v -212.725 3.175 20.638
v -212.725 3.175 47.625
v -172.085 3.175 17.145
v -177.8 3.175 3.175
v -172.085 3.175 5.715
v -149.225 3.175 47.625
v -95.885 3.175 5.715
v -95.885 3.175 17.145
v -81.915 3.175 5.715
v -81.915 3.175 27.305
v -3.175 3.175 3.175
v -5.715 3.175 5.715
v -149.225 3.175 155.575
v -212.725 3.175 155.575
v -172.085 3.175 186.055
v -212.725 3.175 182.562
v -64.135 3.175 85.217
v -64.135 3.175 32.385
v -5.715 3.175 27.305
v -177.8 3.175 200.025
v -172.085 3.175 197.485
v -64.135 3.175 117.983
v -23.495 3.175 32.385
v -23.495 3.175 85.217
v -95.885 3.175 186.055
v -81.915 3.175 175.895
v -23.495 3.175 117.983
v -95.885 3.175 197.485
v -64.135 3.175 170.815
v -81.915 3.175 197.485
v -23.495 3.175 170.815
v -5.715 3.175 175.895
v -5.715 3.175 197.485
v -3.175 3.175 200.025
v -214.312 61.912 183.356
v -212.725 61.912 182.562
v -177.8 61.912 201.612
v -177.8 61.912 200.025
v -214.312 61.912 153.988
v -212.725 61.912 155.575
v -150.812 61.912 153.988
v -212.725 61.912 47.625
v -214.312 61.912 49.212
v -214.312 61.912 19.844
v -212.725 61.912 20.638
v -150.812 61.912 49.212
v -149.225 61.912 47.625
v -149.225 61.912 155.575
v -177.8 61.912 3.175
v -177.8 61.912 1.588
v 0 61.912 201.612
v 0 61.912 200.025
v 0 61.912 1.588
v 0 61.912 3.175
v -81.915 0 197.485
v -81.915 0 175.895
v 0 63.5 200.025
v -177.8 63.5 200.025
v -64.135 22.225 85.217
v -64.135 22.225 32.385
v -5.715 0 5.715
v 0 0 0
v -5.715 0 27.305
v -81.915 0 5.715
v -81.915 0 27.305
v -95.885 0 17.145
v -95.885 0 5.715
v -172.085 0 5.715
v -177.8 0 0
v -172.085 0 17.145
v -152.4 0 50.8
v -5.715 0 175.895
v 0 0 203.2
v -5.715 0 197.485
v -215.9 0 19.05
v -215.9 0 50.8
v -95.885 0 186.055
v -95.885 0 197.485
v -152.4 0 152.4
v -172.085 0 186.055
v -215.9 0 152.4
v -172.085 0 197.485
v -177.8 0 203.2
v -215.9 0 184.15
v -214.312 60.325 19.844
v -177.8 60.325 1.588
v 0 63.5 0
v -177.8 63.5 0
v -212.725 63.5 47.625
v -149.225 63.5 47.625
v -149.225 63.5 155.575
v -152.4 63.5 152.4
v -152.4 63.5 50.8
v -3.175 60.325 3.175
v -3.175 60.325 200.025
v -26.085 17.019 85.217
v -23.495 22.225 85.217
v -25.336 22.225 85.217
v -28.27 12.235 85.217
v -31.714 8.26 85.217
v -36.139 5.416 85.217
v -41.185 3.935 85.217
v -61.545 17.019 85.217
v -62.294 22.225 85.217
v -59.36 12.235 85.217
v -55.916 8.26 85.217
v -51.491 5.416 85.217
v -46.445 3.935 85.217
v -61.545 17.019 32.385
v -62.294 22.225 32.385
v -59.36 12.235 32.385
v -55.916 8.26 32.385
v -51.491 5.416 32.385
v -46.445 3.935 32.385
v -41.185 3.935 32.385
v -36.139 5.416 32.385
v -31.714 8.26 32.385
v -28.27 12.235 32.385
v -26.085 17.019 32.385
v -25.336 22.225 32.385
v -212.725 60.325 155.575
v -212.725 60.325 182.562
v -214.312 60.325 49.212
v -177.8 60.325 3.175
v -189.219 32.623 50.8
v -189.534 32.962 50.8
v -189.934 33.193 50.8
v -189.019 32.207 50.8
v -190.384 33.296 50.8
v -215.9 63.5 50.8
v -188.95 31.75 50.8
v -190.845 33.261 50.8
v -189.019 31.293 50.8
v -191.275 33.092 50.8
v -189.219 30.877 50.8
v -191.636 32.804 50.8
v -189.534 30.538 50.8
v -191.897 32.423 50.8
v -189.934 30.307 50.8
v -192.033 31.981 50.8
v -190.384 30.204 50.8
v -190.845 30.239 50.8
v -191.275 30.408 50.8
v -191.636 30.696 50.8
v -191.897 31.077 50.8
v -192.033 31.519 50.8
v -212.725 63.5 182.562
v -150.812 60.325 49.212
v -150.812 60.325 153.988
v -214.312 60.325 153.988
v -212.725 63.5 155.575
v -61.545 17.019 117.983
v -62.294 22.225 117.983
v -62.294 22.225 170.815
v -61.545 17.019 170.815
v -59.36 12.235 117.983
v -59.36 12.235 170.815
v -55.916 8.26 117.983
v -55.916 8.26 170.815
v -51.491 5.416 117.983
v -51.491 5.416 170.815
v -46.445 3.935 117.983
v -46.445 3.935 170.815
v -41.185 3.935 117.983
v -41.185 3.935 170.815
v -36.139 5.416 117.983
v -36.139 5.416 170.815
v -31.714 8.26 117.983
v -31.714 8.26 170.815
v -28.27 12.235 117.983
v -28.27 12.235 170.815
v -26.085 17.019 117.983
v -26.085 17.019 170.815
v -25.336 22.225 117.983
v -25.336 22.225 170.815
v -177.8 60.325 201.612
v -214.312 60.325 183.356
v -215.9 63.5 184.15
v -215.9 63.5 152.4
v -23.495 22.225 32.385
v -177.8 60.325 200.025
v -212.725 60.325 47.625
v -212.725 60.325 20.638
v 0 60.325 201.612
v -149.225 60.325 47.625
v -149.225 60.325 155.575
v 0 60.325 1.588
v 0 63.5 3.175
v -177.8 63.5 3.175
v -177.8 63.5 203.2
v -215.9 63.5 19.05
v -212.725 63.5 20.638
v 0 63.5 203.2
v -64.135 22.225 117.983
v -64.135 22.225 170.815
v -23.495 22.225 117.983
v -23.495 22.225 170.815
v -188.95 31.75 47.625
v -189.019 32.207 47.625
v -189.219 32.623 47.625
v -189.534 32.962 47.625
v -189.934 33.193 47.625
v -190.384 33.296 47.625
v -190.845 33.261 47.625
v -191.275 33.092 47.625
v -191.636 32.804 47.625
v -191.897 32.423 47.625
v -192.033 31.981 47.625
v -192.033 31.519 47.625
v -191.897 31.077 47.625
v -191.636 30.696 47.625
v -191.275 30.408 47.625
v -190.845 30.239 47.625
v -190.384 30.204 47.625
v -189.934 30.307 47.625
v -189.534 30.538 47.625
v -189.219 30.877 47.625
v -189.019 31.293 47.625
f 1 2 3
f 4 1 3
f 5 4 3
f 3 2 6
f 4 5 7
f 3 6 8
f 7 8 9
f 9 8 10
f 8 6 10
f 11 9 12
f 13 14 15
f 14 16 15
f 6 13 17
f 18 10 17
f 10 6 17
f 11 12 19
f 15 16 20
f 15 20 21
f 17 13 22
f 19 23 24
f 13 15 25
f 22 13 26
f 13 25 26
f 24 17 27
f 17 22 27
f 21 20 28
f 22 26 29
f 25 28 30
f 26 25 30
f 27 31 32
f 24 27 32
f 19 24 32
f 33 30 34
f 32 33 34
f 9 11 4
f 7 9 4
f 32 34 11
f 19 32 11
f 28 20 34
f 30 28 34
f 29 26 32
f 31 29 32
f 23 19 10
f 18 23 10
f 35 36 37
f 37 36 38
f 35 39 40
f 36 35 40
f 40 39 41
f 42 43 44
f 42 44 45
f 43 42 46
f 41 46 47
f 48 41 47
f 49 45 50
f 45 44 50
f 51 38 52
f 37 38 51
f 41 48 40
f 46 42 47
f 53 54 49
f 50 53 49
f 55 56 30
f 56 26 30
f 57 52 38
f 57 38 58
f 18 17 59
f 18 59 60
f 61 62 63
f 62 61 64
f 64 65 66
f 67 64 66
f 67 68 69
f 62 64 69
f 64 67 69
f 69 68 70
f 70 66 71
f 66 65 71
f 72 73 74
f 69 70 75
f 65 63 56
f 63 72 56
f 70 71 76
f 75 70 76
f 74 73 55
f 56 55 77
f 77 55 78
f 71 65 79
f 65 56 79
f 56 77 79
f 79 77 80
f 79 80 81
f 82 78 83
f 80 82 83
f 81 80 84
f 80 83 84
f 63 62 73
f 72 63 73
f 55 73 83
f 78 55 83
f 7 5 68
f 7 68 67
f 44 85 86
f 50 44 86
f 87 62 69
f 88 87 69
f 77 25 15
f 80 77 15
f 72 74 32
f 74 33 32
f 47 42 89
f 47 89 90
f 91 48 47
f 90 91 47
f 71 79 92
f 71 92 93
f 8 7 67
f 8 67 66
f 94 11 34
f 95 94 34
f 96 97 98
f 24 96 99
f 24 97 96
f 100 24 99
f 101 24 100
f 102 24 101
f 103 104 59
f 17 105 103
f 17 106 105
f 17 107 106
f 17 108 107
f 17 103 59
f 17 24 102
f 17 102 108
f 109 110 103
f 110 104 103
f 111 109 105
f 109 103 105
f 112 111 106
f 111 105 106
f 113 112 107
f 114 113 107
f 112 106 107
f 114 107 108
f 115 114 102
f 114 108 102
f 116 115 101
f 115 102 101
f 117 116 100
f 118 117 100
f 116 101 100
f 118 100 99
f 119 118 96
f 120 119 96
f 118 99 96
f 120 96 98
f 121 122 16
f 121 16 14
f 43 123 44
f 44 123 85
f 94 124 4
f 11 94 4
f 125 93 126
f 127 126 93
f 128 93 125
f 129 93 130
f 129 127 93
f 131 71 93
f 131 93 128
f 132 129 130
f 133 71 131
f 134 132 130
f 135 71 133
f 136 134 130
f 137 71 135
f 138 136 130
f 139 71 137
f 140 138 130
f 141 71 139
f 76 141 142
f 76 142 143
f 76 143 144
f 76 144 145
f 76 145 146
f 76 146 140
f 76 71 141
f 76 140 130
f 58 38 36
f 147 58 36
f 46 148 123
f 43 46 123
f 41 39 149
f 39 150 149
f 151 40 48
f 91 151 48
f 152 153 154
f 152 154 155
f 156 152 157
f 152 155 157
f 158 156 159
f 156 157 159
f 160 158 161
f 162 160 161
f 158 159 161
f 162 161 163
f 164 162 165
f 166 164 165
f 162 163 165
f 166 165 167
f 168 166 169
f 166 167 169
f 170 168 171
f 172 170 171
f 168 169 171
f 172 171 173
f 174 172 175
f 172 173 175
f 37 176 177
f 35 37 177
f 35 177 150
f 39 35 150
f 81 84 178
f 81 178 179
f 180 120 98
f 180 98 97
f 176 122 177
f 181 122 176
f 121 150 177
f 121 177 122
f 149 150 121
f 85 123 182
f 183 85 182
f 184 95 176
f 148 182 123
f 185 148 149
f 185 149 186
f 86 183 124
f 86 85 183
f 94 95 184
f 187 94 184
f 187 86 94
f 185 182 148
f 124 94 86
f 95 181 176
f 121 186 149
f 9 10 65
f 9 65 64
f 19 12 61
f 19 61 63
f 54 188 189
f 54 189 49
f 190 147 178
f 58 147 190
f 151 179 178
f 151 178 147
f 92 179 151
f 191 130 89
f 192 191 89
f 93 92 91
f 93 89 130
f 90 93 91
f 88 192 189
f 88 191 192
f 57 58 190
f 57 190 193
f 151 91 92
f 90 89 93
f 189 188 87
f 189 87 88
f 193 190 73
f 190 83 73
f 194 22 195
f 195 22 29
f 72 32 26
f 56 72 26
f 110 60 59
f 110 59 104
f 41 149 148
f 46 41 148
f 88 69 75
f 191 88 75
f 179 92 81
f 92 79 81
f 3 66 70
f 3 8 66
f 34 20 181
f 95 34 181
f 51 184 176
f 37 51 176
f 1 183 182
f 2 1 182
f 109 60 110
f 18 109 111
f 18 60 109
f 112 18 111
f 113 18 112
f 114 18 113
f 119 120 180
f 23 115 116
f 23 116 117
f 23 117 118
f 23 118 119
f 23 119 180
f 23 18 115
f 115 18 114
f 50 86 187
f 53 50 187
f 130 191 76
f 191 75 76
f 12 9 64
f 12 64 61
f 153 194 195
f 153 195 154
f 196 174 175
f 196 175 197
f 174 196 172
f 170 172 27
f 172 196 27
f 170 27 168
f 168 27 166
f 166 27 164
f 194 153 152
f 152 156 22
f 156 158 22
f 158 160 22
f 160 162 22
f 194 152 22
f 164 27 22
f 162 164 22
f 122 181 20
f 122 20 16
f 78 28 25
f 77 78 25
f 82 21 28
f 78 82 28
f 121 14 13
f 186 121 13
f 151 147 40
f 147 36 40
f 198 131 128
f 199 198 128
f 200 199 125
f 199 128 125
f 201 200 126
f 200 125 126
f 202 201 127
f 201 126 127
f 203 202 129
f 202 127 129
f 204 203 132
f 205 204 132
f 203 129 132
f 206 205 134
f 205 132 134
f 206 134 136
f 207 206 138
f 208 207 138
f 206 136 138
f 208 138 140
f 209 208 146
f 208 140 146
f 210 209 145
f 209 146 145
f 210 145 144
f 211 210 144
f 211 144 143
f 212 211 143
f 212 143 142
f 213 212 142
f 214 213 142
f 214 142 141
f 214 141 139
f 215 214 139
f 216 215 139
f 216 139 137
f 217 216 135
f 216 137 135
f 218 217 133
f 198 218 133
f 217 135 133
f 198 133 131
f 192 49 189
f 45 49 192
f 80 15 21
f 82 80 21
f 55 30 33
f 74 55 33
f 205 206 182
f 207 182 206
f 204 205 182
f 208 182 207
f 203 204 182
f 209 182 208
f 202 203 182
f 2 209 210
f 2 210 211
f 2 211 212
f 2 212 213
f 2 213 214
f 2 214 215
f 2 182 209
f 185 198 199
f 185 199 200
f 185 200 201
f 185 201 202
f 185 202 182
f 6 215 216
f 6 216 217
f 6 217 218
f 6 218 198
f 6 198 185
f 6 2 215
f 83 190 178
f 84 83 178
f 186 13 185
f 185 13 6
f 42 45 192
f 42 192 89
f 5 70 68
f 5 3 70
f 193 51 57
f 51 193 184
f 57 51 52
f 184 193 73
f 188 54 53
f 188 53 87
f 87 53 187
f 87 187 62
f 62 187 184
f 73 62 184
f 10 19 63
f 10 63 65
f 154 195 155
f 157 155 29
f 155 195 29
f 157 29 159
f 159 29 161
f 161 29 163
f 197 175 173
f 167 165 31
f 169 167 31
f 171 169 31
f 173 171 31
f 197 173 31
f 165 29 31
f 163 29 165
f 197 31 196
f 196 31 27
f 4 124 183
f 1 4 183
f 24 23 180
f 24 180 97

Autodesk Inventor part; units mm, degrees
ref_plane "YZ Plane" through (0, 0, 0) normal (1, 0, 0) x (0, 1, 0)
sketch "Sketch1" plane through (0, 0, 0) normal (0, 1, 0) x (-1, 0, 0)
  line L0 (0, 0) -> (177.8, 0)
  line L1 (177.8, 0) -> (177.8, 203.2)
  line L2 (177.8, 203.2) -> (0, 203.2)
  line L3 (0, 203.2) -> (0, 0)
  dimension "Body_Length" = 177.8
  dimension "Body_Width" = 203.2
extrude "Base" add sketch "Sketch1" along normal blind 3.175
sketch "Sketch3" plane through (0, 0, 0) normal (0, 1, 0) x (1, 0, 0)
  line L0 (-177.8, 0) -> (-177.8, -203.2) projected
  line L1 (-177.8, -203.2) -> (0, -203.2) projected
  line L2 (0, -203.2) -> (0, 0) projected
  line L3 (0, 0) -> (-177.8, 0) projected
  line L4 (-174.625, -3.175) -> (-3.175, -3.175)
  line L5 (-3.175, -3.175) -> (-3.175, -200.025)
  line L6 (-3.175, -200.025) -> (-174.625, -200.025)
  line L7 (-174.625, -200.025) -> (-174.625, -155.575)
  line L8 (-152.4, -152.4) -> (-152.4, -50.8)
  line L9 (-174.625, -47.625) -> (-174.625, -3.175)
  line L10 (-177.8, 0) -> (-177.8, -203.2) projected
  line L11 (-174.625, -155.575) -> (-149.225, -155.575)
  line L12 (-149.225, -155.575) -> (-149.225, -47.625)
  line L13 (-149.225, -47.625) -> (-174.625, -47.625)
  line L14 (-152.4, -152.4) -> (-177.8, -152.4)
  line L15 (-152.4, -50.8) -> (-177.8, -50.8)
  dimension "Wall_Thickness" = 3.175
  dimension "Cuttout_Width" = 101.6
  dimension "Cuttout_Depth" = 25.4
  dimension "d30" = 3.175
  dimension "d31" = 3.175
  dimension "d32" = 3.175
  dimension "d33" = 3.175
extrude "Wall" add sketch "Sketch3" along normal blind 63.5 contours L3 L2 L1 L0 L14 L8 L15
sketch "Sketch7" plane through (0, 3.175, 0) normal (0, 1, 0) x (1, 0, 0)
  line L0 (-177.8, -50.8) -> (-177.8, -152.4) projected
  line L1 (-177.8, -152.4) -> (-152.4, -152.4) projected
  line L2 (-152.4, -152.4) -> (-152.4, -50.8) projected
  line L3 (-152.4, -50.8) -> (-177.8, -50.8) projected
  point P0 (0, 0)
extrude "Cuttout" cut sketch "Sketch7" against normal through all
sketch "Sketch2" plane through (0, 3.175, 0) normal (0, 1, 0) x (1, 0, 0)
  line L0 (-172.085, -197.485) -> (-95.885, -197.485)
  line L1 (-95.885, -197.485) -> (-95.885, -186.055)
  line L2 (-95.885, -186.055) -> (-172.085, -186.055)
  line L3 (-172.085, -186.055) -> (-172.085, -197.485)
  line L4 (-81.915, -197.485) -> (-5.715, -197.485)
  line L5 (-5.715, -197.485) -> (-5.715, -175.895)
  line L6 (-5.715, -175.895) -> (-81.915, -175.895)
  line L7 (-81.915, -175.895) -> (-81.915, -197.485)
  line L8 (-177.8, 0) -> (-177.8, -203.2) projected
  line L9 (-177.8, -203.2) -> (0, -203.2) projected
  line L10 (0, -203.2) -> (0, 0) projected
  line L11 (-177.8, -101.6) -> (0, -101.6) construction
  line L12 (-172.085, -5.715) -> (-95.885, -5.715)
  line L13 (-95.885, -5.715) -> (-95.885, -17.145)
  line L14 (-95.885, -17.145) -> (-172.085, -17.145)
  line L15 (-172.085, -17.145) -> (-172.085, -5.715)
  line L16 (-81.915, -5.715) -> (-5.715, -5.715)
  line L17 (-5.715, -5.715) -> (-5.715, -27.305)
  line L18 (-5.715, -27.305) -> (-81.915, -27.305)
  line L19 (-81.915, -27.305) -> (-81.915, -5.715)
  line L20 (-88.9, -203.2) -> (-88.9, 0) construction
  line L21 (0, 0) -> (-177.8, 0) projected
  line L22 (-3.175, -200.025) -> (-174.625, -200.025) projected
  line L23 (-174.625, -200.025) -> (-174.625, -155.575) projected
  line L24 (-3.175, -3.175) -> (-3.175, -200.025) projected
  point P0 (-5.715, -186.69)
  point P1 (-5.715, -16.51)
  dimension "Wheel_Hole_Width" = 11.43
  dimension "Wheel_Hole_Diameter" = 76.2
  dimension "d8" = 76.2
  dimension "Driven_Wheel_Width" = 21.59
  dimension "Wheel_Distance_Side" = 2.54
  dimension "d21" = 6.985
  dimension "Wheel_Distance_Front" = 2.54
  dimension "Wheel_Distance_Back" = 2.54
extrude "Wheels" cut sketch "Sketch2" against normal up to next contours L3 L2 L1 L0 | L7 L6 L5 L4 | L12 L13 L14 L15 | L16 L17 L18 L19
ref_plane "Work Plane2" through (0, 0, 101.6) normal (0, 0, -1) x (-1, 0, 0)
ref_plane "Work Plane3" through (-88.9, 0, 203.2) normal (1, 0, 0) x (0, 0, -1)
sketch "Sketch11" plane through (0, 63.5, 0) normal (0, 1, 0) x (1, 0, 0)
  line L0 (-174.625, -47.625) -> (-174.625, -3.175) projected
  line L1 (-177.8, 0) -> (-177.8, -203.2) projected
  line L2 (-174.625, -3.175) -> (-177.8, -3.175)
  line L3 (-177.8, -3.175) -> (-177.8, -47.625)
  line L4 (-177.8, -47.625) -> (-174.625, -47.625)
  line L5 (-174.625, -47.625) -> (-174.625, -3.175)
  line L6 (-149.225, -155.575) -> (-174.625, -155.575) projected
  line L7 (-177.8, -152.4) -> (-177.8, -203.2) projected
  line L8 (-174.625, -155.575) -> (-177.8, -155.575)
  line L9 (-177.8, -155.575) -> (-177.8, -200.025)
  line L10 (-177.8, -200.025) -> (-174.625, -200.025)
  line L11 (-174.625, -200.025) -> (-174.625, -155.575)
  line L12 (-149.225, -47.625) -> (-174.625, -47.625) projected
  line L13 (-3.175, -200.025) -> (-174.625, -200.025) projected
  point P0 (0, 0)
  point P1 (-203.2, -50.8)
extrude "Extrusion11" cut sketch "Sketch11" against normal up to surface (60.325 mm away)
sketch "Sketch12" plane through (0, 0, 0) normal (0, -1, 0) x (1, 0, 0)
  line L0 (-172.085, 17.145) -> (-95.885, 17.145) projected
  line L1 (-95.885, 17.145) -> (-95.885, 5.715) projected
  line L2 (-95.885, 5.715) -> (-172.085, 5.715) projected
  line L3 (-172.085, 5.715) -> (-172.085, 17.145) projected
  line L4 (-5.715, 175.895) -> (-81.915, 175.895) projected
  line L5 (-81.915, 175.895) -> (-81.915, 197.485) projected
  line L6 (-81.915, 197.485) -> (-5.715, 197.485) projected
  line L7 (-5.715, 197.485) -> (-5.715, 175.895) projected
  line L8 (-5.715, 27.305) -> (-5.715, 5.715) projected
  line L9 (-5.715, 5.715) -> (-81.915, 5.715) projected
  line L10 (-81.915, 5.715) -> (-81.915, 27.305) projected
  line L11 (-81.915, 27.305) -> (-5.715, 27.305) projected
  line L12 (-95.885, 186.055) -> (-172.085, 186.055) projected
  line L13 (-172.085, 186.055) -> (-172.085, 197.485) projected
  line L14 (-172.085, 197.485) -> (-95.885, 197.485) projected
  line L15 (-95.885, 197.485) -> (-95.885, 186.055) projected
  line L16 (-152.4, 50.8) -> (-177.8, 50.8) projected
  line L17 (-177.8, 0) -> (-177.8, 50.8) projected
  line L18 (0, 0) -> (-177.8, 0) projected
  line L19 (0, 203.2) -> (0, 0) projected
  line L20 (-177.8, 203.2) -> (0, 203.2) projected
  line L21 (-177.8, 152.4) -> (-177.8, 203.2) projected
  line L22 (-177.8, 152.4) -> (-152.4, 152.4) projected
  line L23 (-152.4, 152.4) -> (-152.4, 50.8) projected
  line L24 (-3.175, 200.025) -> (-177.8, 200.025) projected
  line L25 (-177.8, 200.025) -> (-177.8, 203.2) projected
  line L26 (-177.8, 203.2) -> (0, 203.2) projected
  line L27 (0, 203.2) -> (0, 0) projected
  line L28 (0, 0) -> (-177.8, 0) projected
  line L29 (-177.8, 0) -> (-177.8, 3.175) projected
  line L30 (-177.8, 3.175) -> (-3.175, 3.175) projected
  line L31 (-3.175, 3.175) -> (-3.175, 200.025) projected
  line L32 (-177.8, 155.575) -> (-149.225, 155.575) projected
  line L33 (-149.225, 155.575) -> (-149.225, 47.625) projected
  line L34 (-149.225, 47.625) -> (-177.8, 47.625) projected
  line L35 (-177.8, 47.625) -> (-177.8, 50.8) projected
  line L36 (-177.8, 50.8) -> (-152.4, 50.8) projected
  line L37 (-152.4, 50.8) -> (-152.4, 152.4) projected
  line L38 (-152.4, 152.4) -> (-177.8, 152.4) projected
  line L39 (-177.8, 152.4) -> (-177.8, 155.575) projected
  line L40 (-177.8, 0) -> (-215.9, 19.05)
  line L41 (-215.9, 19.05) -> (-215.9, 50.8)
  line L42 (-215.9, 50.8) -> (-177.8, 50.8)
  line L43 (-177.8, 3.175) -> (-212.725, 20.6375)
  line L44 (-212.725, 20.6375) -> (-212.725, 47.625)
  line L45 (-212.725, 47.625) -> (-177.8, 47.625)
  line L46 (-152.4, 50.8) -> (-152.4, 152.4) projected
  line L47 (-152.4, 101.6) -> (0, 101.6) construction
  line L48 (-177.8, 203.2) -> (-215.9, 184.15)
  line L49 (-215.9, 184.15) -> (-215.9, 152.4)
  line L50 (-215.9, 152.4) -> (-177.8, 152.4)
  line L51 (-177.8, 200.025) -> (-212.725, 182.5625)
  line L52 (-212.725, 182.5625) -> (-212.725, 155.575)
  line L53 (-212.725, 155.575) -> (-177.8, 155.575)
  line L54 (-95.885, 17.145) -> (-172.085, 17.145) projected
  line L55 (-172.085, 17.145) -> (-172.085, 5.715) projected
  line L56 (-172.085, 5.715) -> (-95.885, 5.715) projected
  line L57 (-95.885, 5.715) -> (-95.885, 17.145) projected
  line L58 (-81.915, 175.895) -> (-5.715, 175.895) projected
  line L59 (-5.715, 175.895) -> (-5.715, 197.485) projected
  line L60 (-5.715, 197.485) -> (-81.915, 197.485) projected
  line L61 (-81.915, 197.485) -> (-81.915, 175.895) projected
  line L62 (-5.715, 5.715) -> (-5.715, 27.305) projected
  line L63 (-5.715, 27.305) -> (-81.915, 27.305) projected
  line L64 (-81.915, 27.305) -> (-81.915, 5.715) projected
  line L65 (-81.915, 5.715) -> (-5.715, 5.715) projected
  line L66 (-172.085, 186.055) -> (-95.885, 186.055) projected
  line L67 (-95.885, 186.055) -> (-95.885, 197.485) projected
  line L68 (-95.885, 197.485) -> (-172.085, 197.485) projected
  line L69 (-172.085, 197.485) -> (-172.085, 186.055) projected
  line L70 (-177.8, 47.625) -> (-149.225, 47.625) projected
  line L71 (-149.225, 47.625) -> (-149.225, 155.575) projected
  line L72 (-149.225, 155.575) -> (-177.8, 155.575) projected
  line L73 (-177.8, 200.025) -> (-177.8, 155.575) projected
  line L74 (-177.8, 200.025) -> (-3.175, 200.025) projected
  line L75 (-3.175, 200.025) -> (-3.175, 3.175) projected
  line L76 (-177.8, 3.175) -> (-3.175, 3.175) projected
  line L77 (-177.8, 47.625) -> (-177.8, 3.175) projected
  point P0 (-203.2, 155.575)
  point P1 (-203.2, 200.025)
  point P2 (-203.2, 152.4)
  point P3 (-203.2, 203.2)
  point P4 (-203.2, 3.175)
  point P5 (-203.2, 47.625)
  point P6 (-203.2, 200.025)
  point P7 (-203.2, 3.175)
  point P8 (-203.2, 155.575)
  point P9 (-203.2, 47.625)
  point P10 (-203.2, 50.8)
  point P11 (-203.2, 0)
  dimension "d52" = 3.175
  dimension "d53" = 38.1
  dimension "d54" = 31.75
extrude "Extrusion12" add sketch "Sketch12" against normal up to surface (3.175 mm away) contours L17 L45 L44 L43 L40 L41 L42 | L17 L43 L44 L45 | L50 L49 L48 L21 L51 L52 L53 | L53 L52 L51 L21
extrude "Extrusion13" add sketch "Sketch12" against normal up to surface (63.5 mm away) contours L17 L45 L44 L43 L40 L41 L42 | L50 L49 L48 L21 L51 L52 L53
ref_plane "Work Plane4" through (0, 31.75, 0) normal (0, -1, 0) x (1, 0, 0)
sketch "Sketch13" plane through (-152.4, 0, 50.8) normal (0, 0, 1) x (1, 0, 0)
  line L0 (0, 0) -> (-63.5, 0) projected
  line L1 (0, 63.5) -> (0, 0) projected
  line L2 (0, 63.5) -> (-63.5, 63.5)
  line L3 (-63.5, 0) -> (-63.5, 63.5) projected
  line L4 (-63.5, 63.5) -> (0, 63.5)
  circle A0 centre (-38.1, 31.75) radius 1.55
  line L5 (195.58, 31.75) -> (-106.68, 31.75) projected
  point P0 (152.4, 0)
  point P1 (-33.3, 76.2)
  point P2 (-30.2, 76.2)
  dimension "d59" = 3.1
  dimension "d74" = 25.4
extrude "Extrusion14" cut sketch "Sketch13" against normal up to surface (3.175 mm away) contours L5 A0 | A0 L5
sketch "Sketch15" plane through (0, 0, 203.2) normal (1, 0, 0) x (0, 0, -1)
  line L0 (0, 63.5) -> (19.05, 63.5) projected
  line L1 (3.175, 63.5) -> (200.025, 63.5)
  line L2 (200.025, 63.5) -> (200.025, 60.325)
  line L3 (200.025, 60.325) -> (3.175, 60.325)
  line L4 (3.175, 60.325) -> (3.175, 63.5)
  line L5 (243.84, 31.75) -> (-40.64, 31.75) projected
  line L6 (3.175, 3.175) -> (200.025, 3.175) projected
  line L7 (3.175, 3.175) -> (3.175, 63.5) projected
  line L8 (200.025, 63.5) -> (3.175, 63.5) projected
  line L9 (200.025, 3.175) -> (200.025, 63.5) projected
  point P0 (203.2, 0)
  point P1 (19.05, 63.5)
  dimension "d75" = 3.175
extrude "Extrusion16" cut sketch "Sketch15" against normal up to surface (3.175 mm away) contours L0 L1 L2 L3 L4
ref_plane "Work Plane5" through (0, 60.325, 200.025) normal (0, 1, 0) x (1, 0, 0)
sketch "Sketch17" plane through (0, 60.325, 200.025) normal (0, 1, 0) x (1, 0, 0)
  line L0 (-177.8, 196.85) -> (-3.175, 196.85) projected
  line L1 (0, 196.85) -> (-3.175, 196.85) projected
  line L2 (-177.8, 196.85) -> (0, 196.85) projected
  line L3 (-177.8, 0) -> (-3.175, 0) projected
  line L4 (0, 0) -> (-177.8, 0) projected
  line L5 (0, 0) -> (-3.175, 0) projected
  line L6 (-212.725, 17.4625) -> (-177.8, 0) projected
  line L7 (-212.725, 17.4625) -> (-177.8, 0) projected
  line L8 (-212.725, 44.45) -> (-212.725, 17.4625) projected
  line L9 (-212.725, 44.45) -> (-212.725, 17.4625) projected
  line L10 (-177.8, 196.85) -> (-212.725, 179.3875) projected
  line L11 (-149.225, 44.45) -> (-212.725, 44.45) projected
  line L12 (-212.725, 44.45) -> (-149.225, 44.45) projected
  line L13 (-149.225, 152.4) -> (-149.225, 44.45) projected
  line L14 (-149.225, 44.45) -> (-149.225, 152.4) projected
  line L15 (-212.725, 179.3875) -> (-212.725, 152.4) projected
  line L16 (-212.725, 179.3875) -> (-212.725, 152.4) projected
  line L17 (-192.05, 152.4) -> (-188.95, 152.4) projected
  line L18 (-212.725, 152.4) -> (-149.225, 152.4) projected
  line L19 (-212.725, 152.4) -> (-149.225, 152.4) projected
  line L20 (0, -3.175) -> (0, 200.025) projected
  line L21 (0, -1.5875) -> (-177.8, -1.5875)
  line L22 (-177.8, -1.5875) -> (-214.3125, 16.6688)
  line L23 (-177.8, -3.175) -> (-215.9, 15.875) projected
  line L24 (-214.3125, 16.6688) -> (-214.3125, 46.0375)
  line L25 (-214.3125, 46.0375) -> (-150.8125, 46.0375)
  line L26 (-150.8125, 46.0375) -> (-150.8125, 150.8125)
  line L27 (-150.8125, 150.8125) -> (-214.3125, 150.8125)
  line L28 (-214.3125, 150.8125) -> (-214.3125, 180.1813)
  line L29 (-214.3125, 180.1813) -> (-177.8, 198.4375)
  line L30 (-177.8, 198.4375) -> (0, 198.4375)
  line L31 (-212.725, 179.3875) -> (-215.9, 180.975) construction
  line L32 (-177.8, 196.85) -> (-177.8, 200.025) construction
  line L33 (-152.4, 149.225) -> (-215.9, 149.225) projected
  line L34 (-212.725, 152.4) -> (-215.9, 149.225) construction
  line L35 (-152.4, 149.225) -> (-149.225, 152.4) construction
  line L36 (-152.4, 47.625) -> (-152.4, 149.225) construction
  line L37 (-152.4, 47.625) -> (-149.225, 44.45) construction
  line L38 (-215.9, 47.625) -> (-152.4, 47.625) construction
  line L39 (-212.725, 44.45) -> (-215.9, 47.625) construction
  line L40 (-212.725, 17.4625) -> (-215.9, 15.875) construction
  line L41 (-177.8, -3.175) -> (-177.8, 0) construction
  line L42 (-177.8, -3.175) -> (0, -3.175) construction
  line L43 (-177.8, 196.85) -> (-212.725, 179.3875) projected
  point P0 (-3.175, 0)
  point P1 (-3.175, 196.85)
  point P2 (0, 198.4375)
  dimension "d87" = 1.5875
  dimension "d88" = 1.5875
extrude "Extrusion17" cut sketch "Sketch17" along normal blind 1.5875
sketch "Sketch20" plane through (0, 3.175, 0) normal (0, 1, 0) x (1, 0, 0)
  line L0 (-64.135, -32.385) -> (-23.495, -32.385)
  line L1 (-23.495, -32.385) -> (-23.495, -85.217)
  line L2 (-23.495, -85.217) -> (-64.135, -85.217)
  line L3 (-64.135, -85.217) -> (-64.135, -32.385)
  line L4 (-5.715, -27.305) -> (-81.915, -27.305) projected
  line L5 (-43.815, -243.84) -> (-43.815, 40.64) projected
  line L6 (-212.725, -47.625) -> (-149.225, -47.625) projected
  line L7 (-149.225, -47.625) -> (-149.225, -155.575) projected
  line L8 (-149.225, -155.575) -> (-212.725, -155.575) projected
  line L9 (-212.725, -155.575) -> (-212.725, -182.5625) projected
  line L10 (-212.725, -182.5625) -> (-177.8, -200.025) projected
  line L11 (-177.8, -200.025) -> (-3.175, -200.025) projected
  line L12 (-3.175, -200.025) -> (-3.175, -3.175) projected
  line L13 (-177.8, -3.175) -> (-3.175, -3.175) projected
  line L14 (-177.8, -3.175) -> (-212.725, -20.6375) projected
  line L15 (-212.725, -20.6375) -> (-212.725, -47.625) projected
  line L16 (-95.885, -17.145) -> (-172.085, -17.145) projected
  line L17 (-172.085, -17.145) -> (-172.085, -5.715) projected
  line L18 (-172.085, -5.715) -> (-95.885, -5.715) projected
  line L19 (-95.885, -5.715) -> (-95.885, -17.145) projected
  line L20 (-81.915, -175.895) -> (-5.715, -175.895) projected
  line L21 (-5.715, -175.895) -> (-5.715, -197.485) projected
  line L22 (-5.715, -197.485) -> (-81.915, -197.485) projected
  line L23 (-81.915, -197.485) -> (-81.915, -175.895) projected
  line L24 (-5.715, -5.715) -> (-5.715, -27.305) projected
  line L25 (-5.715, -27.305) -> (-81.915, -27.305) projected
  line L26 (-81.915, -27.305) -> (-81.915, -5.715) projected
  line L27 (-81.915, -5.715) -> (-5.715, -5.715) projected
  line L28 (-172.085, -186.055) -> (-95.885, -186.055) projected
  line L29 (-95.885, -186.055) -> (-95.885, -197.485) projected
  line L30 (-95.885, -197.485) -> (-172.085, -197.485) projected
  line L31 (-172.085, -197.485) -> (-172.085, -186.055) projected
  line L32 (-149.225, -101.6) -> (-3.175, -101.6) construction
  line L33 (-64.135, -170.815) -> (-23.495, -170.815)
  line L34 (-23.495, -170.815) -> (-23.495, -117.983)
  line L35 (-23.495, -117.983) -> (-64.135, -117.983)
  line L36 (-64.135, -117.983) -> (-64.135, -170.815)
  point P0 (0, 0)
  dimension "d92" = 5.08
  dimension "d93" = 40.64
  dimension "d95" = 52.832
  dimension "d101" = 20.32
extrude "Extrusion18" add sketch "Sketch20" along normal blind 19.05 contours L0 L5 L2 L3 | L0 L1 L2 L5 | L35 L34 L33 L5 | L5 L33 L36 L35
sketch "Sketch22" plane through (0, 0, 101.6) normal (0, 0, -1) x (-1, 0, 0)
  line L0 (64.135, 22.225) -> (23.495, 22.225) projected
  arc A0 (25.3365, 22.225) -> (62.2935, 22.225) centre (43.815, 22.225) ccw
  line L1 (23.495, 3.175) -> (64.135, 3.175) projected
  line L2 (23.495, 3.175) -> (23.495, 22.225) projected
  line L3 (64.135, 22.225) -> (23.495, 22.225) projected
  line L4 (64.135, 3.175) -> (64.135, 22.225) projected
  point P0 (0, 0)
  dimension "d98" = 36.957
extrude "Extrusion19" cut sketch "Sketch22" along normal mid plane 139.7 contours A0 L0
equation "\"Bottom_Thickness\" = Wall_Thickness"
equation "\"d30\" = Wall_Thickness"
equation "\"d31\" = Wall_Thickness"
equation "\"d32\" = Wall_Thickness"
equation "\"d33\" = Wall_Thickness"
equation "\"d8\" = Wheel_Hole_Diameter"
equation "\"Wheel_Distance_Front\" = Wheel_Distance_Back"
equation "\"d52\" = Wall_Thickness"
equation "\"d75\" = Wall_Thickness"
equation "\"d87\" = 0.5 * Wall_Thickness"
equation "\"d89\" = 0.5 * Wall_Thickness"
equation "\"d101\" = 0.5 * d93"
equation "\"d72\" = -0.5 * Wall_Height"
equation "\"Wall_Height\" = 63.5"
properties part number "Bot v1 bottom" material "PBT Plastic"
